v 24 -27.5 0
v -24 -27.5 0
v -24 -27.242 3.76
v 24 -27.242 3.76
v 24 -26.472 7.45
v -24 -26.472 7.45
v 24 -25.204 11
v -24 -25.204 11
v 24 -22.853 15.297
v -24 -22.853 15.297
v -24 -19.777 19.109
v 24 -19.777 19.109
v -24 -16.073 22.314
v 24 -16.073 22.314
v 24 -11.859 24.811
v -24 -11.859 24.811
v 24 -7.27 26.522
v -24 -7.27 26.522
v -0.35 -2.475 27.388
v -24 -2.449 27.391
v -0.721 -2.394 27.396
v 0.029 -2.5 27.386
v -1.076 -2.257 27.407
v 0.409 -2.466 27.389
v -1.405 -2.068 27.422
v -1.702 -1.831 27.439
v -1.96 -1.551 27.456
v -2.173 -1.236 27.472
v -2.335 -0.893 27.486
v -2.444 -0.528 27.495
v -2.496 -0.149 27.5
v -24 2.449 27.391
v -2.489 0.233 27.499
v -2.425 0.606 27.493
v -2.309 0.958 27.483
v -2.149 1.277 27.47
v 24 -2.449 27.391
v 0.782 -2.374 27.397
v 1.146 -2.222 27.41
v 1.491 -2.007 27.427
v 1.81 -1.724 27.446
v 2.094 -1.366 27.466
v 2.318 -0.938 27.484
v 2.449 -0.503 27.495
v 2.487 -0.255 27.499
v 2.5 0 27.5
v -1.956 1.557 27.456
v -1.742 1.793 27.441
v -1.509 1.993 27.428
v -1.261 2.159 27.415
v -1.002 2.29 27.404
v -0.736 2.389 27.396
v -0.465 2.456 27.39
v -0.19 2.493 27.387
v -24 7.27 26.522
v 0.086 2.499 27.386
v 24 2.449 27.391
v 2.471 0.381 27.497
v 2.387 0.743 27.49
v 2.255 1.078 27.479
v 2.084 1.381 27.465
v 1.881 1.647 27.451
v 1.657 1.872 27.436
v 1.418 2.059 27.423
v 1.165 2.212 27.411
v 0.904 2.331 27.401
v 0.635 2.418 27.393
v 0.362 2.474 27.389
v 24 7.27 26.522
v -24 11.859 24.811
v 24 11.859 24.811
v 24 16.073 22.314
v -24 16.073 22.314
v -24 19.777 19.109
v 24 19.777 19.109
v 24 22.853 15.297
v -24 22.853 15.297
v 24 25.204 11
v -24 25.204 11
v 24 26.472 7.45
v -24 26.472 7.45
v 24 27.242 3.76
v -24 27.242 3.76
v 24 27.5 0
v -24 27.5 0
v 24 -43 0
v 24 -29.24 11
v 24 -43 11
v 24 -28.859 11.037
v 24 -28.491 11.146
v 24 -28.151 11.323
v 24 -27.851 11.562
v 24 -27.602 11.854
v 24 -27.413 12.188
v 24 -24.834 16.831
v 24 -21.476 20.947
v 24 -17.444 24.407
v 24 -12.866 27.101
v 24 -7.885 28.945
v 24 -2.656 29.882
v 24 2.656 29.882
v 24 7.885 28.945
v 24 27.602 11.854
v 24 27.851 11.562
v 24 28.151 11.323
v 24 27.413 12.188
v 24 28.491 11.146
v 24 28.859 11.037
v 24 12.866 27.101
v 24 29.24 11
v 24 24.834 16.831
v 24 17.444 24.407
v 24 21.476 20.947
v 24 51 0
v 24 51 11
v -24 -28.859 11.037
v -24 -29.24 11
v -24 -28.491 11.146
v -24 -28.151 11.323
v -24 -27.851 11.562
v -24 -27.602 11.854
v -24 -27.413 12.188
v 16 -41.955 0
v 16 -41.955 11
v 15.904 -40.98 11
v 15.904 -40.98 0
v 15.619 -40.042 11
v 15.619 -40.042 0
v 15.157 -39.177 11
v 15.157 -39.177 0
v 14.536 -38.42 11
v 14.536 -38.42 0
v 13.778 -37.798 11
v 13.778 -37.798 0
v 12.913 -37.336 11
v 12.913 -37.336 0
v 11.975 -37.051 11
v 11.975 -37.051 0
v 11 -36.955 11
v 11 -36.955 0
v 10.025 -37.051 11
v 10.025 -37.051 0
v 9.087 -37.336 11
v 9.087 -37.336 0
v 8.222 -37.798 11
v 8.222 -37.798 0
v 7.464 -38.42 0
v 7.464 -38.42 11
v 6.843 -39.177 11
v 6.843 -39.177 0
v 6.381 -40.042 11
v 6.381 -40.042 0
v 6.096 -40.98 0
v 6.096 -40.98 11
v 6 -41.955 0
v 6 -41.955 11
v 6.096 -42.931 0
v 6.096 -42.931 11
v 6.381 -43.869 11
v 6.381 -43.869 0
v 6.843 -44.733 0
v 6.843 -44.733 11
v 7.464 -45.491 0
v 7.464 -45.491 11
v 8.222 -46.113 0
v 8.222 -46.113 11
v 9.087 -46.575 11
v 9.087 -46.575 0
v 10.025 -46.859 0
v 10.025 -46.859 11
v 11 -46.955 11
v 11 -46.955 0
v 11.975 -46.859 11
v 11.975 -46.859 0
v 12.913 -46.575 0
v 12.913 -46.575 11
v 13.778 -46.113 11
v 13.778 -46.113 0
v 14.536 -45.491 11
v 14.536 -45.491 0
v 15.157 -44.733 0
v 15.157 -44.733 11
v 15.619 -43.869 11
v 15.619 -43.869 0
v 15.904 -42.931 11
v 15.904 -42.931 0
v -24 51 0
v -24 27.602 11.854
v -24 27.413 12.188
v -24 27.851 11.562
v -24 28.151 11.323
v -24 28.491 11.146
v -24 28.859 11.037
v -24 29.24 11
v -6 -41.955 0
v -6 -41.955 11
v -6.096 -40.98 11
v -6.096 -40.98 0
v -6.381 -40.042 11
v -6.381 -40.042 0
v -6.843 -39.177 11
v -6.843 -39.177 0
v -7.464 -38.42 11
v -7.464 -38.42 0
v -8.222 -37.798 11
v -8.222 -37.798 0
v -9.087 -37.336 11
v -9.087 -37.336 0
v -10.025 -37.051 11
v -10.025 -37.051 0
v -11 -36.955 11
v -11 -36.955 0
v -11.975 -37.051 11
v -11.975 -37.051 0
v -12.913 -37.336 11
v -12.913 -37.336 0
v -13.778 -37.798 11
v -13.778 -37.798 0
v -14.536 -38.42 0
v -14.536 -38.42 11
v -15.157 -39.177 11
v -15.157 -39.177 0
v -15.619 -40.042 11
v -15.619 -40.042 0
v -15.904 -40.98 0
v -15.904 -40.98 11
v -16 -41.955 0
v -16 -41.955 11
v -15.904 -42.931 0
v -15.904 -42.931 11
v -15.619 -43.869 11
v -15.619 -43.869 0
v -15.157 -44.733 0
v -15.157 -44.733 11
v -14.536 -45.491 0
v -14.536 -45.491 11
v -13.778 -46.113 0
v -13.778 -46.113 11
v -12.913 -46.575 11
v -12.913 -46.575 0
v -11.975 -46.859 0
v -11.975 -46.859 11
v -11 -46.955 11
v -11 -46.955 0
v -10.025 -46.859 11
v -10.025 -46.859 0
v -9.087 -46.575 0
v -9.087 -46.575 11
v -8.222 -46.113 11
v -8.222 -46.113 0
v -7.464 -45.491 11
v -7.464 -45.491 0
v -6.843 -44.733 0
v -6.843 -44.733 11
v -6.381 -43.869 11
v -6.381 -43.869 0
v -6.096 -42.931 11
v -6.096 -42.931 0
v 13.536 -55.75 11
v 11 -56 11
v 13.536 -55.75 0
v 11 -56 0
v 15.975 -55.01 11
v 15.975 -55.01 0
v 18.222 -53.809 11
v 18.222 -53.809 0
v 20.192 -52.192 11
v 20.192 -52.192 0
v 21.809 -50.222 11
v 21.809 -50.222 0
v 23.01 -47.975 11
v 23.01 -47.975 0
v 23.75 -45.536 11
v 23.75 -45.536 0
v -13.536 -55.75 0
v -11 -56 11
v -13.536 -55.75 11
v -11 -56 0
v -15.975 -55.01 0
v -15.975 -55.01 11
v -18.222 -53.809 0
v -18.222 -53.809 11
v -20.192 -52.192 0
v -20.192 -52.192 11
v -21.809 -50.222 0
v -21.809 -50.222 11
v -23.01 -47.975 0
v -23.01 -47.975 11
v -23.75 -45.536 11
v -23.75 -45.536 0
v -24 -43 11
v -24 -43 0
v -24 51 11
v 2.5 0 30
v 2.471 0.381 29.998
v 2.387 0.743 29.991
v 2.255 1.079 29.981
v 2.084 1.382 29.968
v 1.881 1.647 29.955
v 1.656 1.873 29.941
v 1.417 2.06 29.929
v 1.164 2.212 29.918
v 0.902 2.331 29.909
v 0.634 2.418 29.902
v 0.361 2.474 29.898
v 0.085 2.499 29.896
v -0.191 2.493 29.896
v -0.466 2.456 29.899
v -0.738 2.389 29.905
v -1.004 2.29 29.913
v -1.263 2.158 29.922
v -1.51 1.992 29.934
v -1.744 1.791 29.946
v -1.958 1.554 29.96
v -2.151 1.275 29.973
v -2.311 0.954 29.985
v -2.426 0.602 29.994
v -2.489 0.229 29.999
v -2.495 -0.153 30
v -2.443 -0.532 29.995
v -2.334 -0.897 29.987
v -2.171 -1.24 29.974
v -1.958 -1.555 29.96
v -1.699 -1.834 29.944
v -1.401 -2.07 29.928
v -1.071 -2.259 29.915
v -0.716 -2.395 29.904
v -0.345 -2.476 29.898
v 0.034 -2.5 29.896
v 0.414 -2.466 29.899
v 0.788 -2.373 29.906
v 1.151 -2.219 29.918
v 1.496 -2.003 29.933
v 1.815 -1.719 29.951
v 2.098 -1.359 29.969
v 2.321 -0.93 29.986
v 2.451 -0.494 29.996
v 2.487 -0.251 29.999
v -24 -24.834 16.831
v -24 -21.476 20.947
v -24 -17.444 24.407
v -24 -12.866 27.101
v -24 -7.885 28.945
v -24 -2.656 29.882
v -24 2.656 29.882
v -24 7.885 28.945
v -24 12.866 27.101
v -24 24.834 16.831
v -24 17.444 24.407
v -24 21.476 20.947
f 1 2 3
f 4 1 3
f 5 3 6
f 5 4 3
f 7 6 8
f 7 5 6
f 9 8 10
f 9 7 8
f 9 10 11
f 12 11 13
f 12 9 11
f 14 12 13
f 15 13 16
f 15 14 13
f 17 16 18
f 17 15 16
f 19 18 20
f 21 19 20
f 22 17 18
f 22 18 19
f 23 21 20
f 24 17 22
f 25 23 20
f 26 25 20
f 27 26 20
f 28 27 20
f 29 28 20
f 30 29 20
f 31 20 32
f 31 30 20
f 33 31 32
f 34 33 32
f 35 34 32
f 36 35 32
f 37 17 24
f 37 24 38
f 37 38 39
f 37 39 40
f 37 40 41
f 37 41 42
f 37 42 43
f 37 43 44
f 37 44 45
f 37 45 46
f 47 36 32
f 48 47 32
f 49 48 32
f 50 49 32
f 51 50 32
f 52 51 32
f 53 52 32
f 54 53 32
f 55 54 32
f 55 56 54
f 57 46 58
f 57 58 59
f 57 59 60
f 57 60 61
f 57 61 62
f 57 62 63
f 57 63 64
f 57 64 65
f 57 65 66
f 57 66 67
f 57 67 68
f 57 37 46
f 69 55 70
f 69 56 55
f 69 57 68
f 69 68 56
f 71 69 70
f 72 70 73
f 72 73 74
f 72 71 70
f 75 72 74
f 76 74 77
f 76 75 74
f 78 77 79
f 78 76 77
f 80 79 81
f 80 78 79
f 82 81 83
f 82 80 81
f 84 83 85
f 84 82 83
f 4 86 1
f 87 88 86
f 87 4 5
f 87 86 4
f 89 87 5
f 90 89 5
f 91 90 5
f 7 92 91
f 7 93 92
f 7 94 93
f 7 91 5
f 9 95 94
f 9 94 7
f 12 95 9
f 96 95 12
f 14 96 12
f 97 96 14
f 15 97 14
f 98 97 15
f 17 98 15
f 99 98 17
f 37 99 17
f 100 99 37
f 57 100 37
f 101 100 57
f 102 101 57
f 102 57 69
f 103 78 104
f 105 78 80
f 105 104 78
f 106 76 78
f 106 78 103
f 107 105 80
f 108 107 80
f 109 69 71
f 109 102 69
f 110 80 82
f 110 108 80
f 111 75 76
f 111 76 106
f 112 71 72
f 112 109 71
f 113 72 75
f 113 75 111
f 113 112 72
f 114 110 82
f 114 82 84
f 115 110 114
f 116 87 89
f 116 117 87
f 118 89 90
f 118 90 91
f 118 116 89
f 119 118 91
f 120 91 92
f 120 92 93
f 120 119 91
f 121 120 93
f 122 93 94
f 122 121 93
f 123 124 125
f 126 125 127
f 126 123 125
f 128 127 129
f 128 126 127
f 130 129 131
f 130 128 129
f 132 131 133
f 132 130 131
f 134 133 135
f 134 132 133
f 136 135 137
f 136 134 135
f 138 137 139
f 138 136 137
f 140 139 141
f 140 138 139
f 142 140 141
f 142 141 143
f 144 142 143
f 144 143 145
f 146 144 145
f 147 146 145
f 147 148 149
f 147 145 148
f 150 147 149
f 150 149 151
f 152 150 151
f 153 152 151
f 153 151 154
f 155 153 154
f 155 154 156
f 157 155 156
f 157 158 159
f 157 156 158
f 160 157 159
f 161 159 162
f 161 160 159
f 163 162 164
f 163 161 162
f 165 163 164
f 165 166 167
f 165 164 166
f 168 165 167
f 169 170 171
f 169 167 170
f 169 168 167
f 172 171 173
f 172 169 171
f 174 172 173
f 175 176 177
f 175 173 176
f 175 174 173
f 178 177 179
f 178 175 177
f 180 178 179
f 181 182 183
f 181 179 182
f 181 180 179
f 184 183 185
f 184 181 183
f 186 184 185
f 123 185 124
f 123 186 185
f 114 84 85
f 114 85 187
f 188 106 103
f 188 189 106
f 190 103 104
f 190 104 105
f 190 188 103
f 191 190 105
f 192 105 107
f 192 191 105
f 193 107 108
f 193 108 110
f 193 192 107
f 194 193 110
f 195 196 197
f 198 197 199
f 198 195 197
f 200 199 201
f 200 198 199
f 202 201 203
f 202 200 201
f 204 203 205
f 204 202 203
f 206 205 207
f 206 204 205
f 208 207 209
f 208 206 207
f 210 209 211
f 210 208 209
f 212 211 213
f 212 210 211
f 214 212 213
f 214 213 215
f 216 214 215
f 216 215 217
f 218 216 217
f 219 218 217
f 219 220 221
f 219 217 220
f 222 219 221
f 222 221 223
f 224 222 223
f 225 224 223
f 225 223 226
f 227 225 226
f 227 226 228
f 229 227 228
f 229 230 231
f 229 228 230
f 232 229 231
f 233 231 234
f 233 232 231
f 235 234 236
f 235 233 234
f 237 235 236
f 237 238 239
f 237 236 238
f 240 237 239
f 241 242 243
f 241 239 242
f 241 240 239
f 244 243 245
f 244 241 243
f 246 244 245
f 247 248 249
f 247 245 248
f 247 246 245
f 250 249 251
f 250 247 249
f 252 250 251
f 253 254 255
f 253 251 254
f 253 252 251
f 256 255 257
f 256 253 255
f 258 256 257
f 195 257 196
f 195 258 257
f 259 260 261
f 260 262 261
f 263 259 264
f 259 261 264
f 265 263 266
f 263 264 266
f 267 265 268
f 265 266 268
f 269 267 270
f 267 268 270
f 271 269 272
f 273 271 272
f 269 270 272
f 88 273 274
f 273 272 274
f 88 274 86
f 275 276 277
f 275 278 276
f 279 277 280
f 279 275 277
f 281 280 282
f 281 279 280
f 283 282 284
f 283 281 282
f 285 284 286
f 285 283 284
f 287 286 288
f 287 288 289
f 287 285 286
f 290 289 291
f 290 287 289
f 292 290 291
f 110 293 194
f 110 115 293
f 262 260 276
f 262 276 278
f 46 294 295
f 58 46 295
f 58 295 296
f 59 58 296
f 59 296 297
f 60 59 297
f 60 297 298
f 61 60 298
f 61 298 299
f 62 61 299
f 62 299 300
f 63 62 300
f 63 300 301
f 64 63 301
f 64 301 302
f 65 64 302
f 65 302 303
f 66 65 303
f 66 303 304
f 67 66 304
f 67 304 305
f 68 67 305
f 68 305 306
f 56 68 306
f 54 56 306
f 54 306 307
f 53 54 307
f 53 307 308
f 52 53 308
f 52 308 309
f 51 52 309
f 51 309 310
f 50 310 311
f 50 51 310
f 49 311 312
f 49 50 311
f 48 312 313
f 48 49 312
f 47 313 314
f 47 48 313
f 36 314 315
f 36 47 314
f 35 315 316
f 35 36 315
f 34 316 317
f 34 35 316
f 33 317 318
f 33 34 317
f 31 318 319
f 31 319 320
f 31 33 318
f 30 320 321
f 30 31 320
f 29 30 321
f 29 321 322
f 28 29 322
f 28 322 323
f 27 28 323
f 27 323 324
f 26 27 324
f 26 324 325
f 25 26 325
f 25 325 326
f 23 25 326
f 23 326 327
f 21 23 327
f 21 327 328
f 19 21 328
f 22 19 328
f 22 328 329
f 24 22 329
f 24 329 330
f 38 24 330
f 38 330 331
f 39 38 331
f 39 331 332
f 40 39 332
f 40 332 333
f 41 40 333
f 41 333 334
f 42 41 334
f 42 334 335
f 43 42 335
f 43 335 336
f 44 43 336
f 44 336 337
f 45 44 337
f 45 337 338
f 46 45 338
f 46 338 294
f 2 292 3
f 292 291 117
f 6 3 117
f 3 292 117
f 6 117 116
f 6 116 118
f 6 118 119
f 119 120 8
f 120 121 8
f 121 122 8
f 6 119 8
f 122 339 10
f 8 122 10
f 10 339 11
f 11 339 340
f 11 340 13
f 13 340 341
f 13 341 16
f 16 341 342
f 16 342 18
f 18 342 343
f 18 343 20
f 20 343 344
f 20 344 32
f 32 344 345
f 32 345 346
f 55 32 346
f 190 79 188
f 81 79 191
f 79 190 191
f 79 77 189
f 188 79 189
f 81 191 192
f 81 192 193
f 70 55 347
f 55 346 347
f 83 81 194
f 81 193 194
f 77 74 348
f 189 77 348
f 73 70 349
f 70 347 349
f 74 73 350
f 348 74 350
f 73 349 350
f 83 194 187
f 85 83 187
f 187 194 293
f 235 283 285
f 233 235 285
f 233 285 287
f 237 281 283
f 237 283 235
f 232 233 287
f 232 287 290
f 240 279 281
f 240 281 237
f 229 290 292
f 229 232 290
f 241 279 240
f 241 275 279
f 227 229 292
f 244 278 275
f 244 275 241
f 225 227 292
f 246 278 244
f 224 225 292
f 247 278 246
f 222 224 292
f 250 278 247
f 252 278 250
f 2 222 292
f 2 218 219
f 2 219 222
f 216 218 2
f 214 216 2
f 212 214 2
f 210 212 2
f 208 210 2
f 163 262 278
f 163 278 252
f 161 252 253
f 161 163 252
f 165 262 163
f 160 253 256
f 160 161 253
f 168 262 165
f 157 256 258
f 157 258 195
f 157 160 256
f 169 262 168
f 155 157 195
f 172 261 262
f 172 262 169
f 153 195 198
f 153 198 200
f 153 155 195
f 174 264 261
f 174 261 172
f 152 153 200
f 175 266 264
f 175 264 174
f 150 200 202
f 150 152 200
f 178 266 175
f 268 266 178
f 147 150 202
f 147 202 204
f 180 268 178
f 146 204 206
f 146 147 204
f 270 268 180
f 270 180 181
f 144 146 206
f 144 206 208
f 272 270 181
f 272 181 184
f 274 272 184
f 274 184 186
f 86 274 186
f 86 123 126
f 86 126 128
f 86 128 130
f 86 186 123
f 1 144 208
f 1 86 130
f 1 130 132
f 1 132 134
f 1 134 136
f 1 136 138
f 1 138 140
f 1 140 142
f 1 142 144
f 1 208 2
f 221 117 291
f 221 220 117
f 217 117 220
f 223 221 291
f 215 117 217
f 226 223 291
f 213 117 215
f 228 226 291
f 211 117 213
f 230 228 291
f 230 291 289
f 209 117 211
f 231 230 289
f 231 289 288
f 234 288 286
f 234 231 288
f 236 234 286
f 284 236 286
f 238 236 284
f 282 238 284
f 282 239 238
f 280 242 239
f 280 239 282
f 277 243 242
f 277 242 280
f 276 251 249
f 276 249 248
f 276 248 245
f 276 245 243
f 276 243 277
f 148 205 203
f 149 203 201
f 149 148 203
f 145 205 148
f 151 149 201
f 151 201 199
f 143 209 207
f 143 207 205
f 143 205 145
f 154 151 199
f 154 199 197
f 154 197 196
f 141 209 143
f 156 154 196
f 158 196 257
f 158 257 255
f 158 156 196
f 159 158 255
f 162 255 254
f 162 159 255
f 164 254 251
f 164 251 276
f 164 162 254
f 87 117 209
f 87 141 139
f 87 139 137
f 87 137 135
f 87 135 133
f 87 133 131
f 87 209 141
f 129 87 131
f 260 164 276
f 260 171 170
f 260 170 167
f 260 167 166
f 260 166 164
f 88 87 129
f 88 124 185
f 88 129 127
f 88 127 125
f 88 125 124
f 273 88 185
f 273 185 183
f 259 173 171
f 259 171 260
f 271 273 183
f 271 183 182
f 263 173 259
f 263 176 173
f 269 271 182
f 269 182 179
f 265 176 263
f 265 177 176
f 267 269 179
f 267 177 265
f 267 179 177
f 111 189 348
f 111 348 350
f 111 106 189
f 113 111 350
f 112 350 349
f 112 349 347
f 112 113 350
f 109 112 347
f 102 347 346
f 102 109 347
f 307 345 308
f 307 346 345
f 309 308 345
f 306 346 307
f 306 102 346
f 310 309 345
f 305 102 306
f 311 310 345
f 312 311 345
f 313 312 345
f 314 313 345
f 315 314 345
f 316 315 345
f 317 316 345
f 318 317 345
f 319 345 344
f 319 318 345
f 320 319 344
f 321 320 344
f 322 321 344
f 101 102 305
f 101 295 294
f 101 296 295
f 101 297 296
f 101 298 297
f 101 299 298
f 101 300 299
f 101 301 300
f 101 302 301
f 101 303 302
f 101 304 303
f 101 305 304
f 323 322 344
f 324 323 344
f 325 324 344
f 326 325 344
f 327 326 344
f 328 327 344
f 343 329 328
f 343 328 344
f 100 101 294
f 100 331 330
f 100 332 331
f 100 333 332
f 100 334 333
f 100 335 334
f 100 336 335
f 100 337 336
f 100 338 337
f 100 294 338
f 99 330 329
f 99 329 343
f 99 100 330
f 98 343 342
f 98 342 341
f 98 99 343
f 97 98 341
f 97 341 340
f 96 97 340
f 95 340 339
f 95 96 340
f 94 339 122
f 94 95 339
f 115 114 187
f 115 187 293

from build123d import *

# Parameters (mm, degrees)
F1_DEPTH = 24
F2_R     = 2.5
F2_R_2   = 5
F3_DEPTH = 30.001
F4_R     = 13
F5_R     = 2


with BuildPart() as f1:
    # F0 (on Right) → F1 (new body, symmetric)
    with BuildSketch(Plane.YZ):
        with BuildLine():
            Line((-56, 0), (-30, 0))
            ThreePointArc((-30, 0), (-29.4730143031, 5.5983415304), (-27.9105714739, 11))
            Line((-27.9105714739, 11), (-56, 11))
            Line((-56, 11), (-56, 0))
        make_face()
        with BuildLine():
            Line((-30, 0), (-27.5, 0))
            ThreePointArc((-27.5, 0), (-26.9199236056, 5.6185152015), (-25.2041663223, 11))
            Line((-25.2041663223, 11), (-27.9105714739, 11))
            ThreePointArc((-27.9105714739, 11), (-29.4730143031, 5.5983415304), (-30, 0))
        make_face()
        with BuildLine():
            ThreePointArc((-25.2041663223, 11), (0, 27.5), (25.2041663223, 11))
            Line((25.2041663223, 11), (27.9105714739, 11))
            ThreePointArc((27.9105714739, 11), (0, 30), (-27.9105714739, 11))
            Line((-27.9105714739, 11), (-25.2041663223, 11))
        make_face()
        with BuildLine():
            ThreePointArc((25.2041663223, 11), (26.9199236056, 5.6185152015), (27.5, 0))
            Line((27.5, 0), (30, 0))
            ThreePointArc((30, 0), (29.4730143031, 5.5983415304), (27.9105714739, 11))
            Line((27.9105714739, 11), (25.2041663223, 11))
        make_face()
        with BuildLine():
            ThreePointArc((27.9105714739, 11), (29.4730143031, 5.5983415304), (30, 0))
            Line((30, 0), (51, 0))
            Line((51, 0), (51, 11))
            Line((51, 11), (40, 11))
            Line((40, 11), (27.9105714739, 11))
        make_face()
    extrude(amount=F1_DEPTH, both=True)

    # F2 (on Top) → F3 (cut, through all)
    with BuildSketch(Plane.XY):
        Circle(F2_R)
        with Locations((-11, -41.955285737)):
            Circle(F2_R_2)
        with Locations((11, -41.955285737)):
            Circle(F2_R_2)
    extrude(amount=F3_DEPTH, mode=Mode.SUBTRACT)

    # F4
    f4_edges = [f1.edges().sort_by_distance(p)[0] for p in [
        (24, -56, 5.5),
        (-24, -56, 5.5),
    ]]
    fillet(f4_edges, radius=F4_R)

    # F5
    f5_edges = [f1.edges().sort_by_distance(p)[0] for p in [
        (0, -27.910571, 11),
        (0, 27.910571, 11),
    ]]
    fillet(f5_edges, radius=F5_R)


solid = f1.part
